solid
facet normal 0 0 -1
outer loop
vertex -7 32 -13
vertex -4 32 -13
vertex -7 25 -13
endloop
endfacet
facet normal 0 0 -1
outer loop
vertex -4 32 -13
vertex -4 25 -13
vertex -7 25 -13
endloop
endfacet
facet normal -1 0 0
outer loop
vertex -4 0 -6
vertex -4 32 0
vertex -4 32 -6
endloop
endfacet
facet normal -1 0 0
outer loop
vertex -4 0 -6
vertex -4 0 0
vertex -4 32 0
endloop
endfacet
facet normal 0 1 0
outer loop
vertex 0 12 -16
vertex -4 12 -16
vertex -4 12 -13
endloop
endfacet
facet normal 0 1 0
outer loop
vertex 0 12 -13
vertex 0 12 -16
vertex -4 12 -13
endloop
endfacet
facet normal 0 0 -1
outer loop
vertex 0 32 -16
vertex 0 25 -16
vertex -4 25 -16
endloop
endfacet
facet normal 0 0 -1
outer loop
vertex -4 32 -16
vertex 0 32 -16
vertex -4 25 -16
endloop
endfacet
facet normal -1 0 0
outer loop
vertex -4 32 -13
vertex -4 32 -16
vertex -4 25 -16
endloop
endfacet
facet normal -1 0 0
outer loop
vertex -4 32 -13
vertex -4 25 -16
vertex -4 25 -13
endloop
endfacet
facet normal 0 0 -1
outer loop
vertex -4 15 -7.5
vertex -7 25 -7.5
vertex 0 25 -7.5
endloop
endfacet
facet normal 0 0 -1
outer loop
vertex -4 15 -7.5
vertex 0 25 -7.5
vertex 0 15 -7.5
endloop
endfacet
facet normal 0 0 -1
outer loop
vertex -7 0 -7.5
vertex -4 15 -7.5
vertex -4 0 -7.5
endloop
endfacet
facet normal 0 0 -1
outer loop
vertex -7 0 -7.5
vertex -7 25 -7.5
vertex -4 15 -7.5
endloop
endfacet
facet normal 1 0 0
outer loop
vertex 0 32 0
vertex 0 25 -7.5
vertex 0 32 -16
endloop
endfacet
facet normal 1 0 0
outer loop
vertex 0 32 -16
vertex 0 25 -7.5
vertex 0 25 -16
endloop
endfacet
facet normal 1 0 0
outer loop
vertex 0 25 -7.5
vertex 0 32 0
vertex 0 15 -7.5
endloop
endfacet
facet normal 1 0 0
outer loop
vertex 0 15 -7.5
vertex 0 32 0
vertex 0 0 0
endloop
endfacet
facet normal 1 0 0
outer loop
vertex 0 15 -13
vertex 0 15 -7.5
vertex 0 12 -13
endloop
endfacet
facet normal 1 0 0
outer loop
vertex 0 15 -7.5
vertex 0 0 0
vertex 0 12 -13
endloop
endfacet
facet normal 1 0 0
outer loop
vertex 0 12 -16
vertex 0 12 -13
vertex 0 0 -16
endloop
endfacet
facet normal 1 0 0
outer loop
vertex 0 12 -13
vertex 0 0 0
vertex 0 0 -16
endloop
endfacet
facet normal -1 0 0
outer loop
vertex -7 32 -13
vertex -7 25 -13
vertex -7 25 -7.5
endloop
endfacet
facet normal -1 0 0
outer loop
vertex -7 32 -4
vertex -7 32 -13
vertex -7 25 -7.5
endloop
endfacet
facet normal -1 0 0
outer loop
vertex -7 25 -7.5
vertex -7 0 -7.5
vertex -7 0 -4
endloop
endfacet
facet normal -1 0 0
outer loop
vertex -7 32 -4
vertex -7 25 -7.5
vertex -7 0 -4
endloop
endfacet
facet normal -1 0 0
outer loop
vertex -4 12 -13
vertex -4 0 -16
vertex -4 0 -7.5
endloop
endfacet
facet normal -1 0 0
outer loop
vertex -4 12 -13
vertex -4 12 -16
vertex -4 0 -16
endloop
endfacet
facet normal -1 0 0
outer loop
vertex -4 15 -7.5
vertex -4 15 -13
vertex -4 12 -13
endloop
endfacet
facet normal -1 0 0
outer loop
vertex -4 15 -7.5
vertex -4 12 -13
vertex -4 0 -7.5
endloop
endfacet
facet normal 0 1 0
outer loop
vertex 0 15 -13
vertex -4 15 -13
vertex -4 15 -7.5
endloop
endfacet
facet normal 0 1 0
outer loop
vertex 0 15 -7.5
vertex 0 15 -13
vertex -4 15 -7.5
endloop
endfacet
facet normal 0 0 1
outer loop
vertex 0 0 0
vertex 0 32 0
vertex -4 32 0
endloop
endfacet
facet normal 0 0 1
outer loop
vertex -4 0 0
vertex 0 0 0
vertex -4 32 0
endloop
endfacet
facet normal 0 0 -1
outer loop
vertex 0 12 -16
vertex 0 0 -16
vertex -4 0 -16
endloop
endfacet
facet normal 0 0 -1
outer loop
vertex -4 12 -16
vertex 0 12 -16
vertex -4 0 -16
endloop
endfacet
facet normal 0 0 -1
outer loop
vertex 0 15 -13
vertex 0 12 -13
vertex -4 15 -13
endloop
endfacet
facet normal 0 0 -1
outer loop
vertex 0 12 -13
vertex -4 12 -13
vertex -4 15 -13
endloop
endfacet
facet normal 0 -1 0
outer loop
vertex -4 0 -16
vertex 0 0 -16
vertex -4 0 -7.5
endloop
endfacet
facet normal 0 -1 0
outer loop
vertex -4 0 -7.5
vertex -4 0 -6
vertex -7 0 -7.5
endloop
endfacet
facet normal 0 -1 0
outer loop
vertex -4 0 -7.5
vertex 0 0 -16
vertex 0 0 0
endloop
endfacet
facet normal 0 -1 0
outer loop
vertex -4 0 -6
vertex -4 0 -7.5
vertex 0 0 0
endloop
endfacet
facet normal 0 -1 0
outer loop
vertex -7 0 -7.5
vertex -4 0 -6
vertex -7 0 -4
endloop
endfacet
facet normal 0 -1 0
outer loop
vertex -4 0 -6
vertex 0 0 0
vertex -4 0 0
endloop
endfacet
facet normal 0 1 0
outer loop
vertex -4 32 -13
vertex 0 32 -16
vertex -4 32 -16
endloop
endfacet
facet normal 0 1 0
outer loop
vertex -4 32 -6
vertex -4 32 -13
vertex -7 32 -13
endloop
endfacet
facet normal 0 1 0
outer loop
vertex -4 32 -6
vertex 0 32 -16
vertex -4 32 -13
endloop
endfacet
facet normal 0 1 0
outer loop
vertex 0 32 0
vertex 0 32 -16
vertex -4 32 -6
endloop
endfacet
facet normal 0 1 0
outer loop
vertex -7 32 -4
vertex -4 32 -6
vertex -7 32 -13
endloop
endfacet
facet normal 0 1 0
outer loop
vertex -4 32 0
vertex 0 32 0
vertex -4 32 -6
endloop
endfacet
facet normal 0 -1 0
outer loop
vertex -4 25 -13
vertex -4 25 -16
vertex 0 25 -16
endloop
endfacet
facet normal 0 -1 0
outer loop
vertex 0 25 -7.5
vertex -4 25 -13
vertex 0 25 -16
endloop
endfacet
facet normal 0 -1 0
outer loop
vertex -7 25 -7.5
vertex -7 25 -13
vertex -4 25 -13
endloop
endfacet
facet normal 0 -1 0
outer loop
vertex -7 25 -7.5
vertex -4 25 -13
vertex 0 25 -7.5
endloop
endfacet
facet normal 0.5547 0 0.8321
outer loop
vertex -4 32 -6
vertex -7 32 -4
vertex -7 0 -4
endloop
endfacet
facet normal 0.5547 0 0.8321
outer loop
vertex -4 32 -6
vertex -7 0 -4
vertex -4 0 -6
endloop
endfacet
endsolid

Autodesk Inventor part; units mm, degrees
ref_plane "YZ Plane" through (0, 0, 0) normal (1, 0, 0) x (0, 1, 0)
ref_plane "XZ Plane" through (0, 0, 0) normal (0, 1, 0) x (-1, 0, 0)
ref_plane "XY Plane" through (0, 0, 0) normal (0, 0, 1) x (1, 0, 0)
sketch "Sketch1" plane through (0, 0, 0) normal (0, 1, 0) x (-1, 0, 0)
  line L0 (0, 0) -> (0, -16)
  line L1 (0, -16) -> (4, -16)
  line L2 (0, 0) -> (4, 0)
  line L3 (4, 0) -> (4, -6)
  line L4 (4, -16) -> (4, -13)
  line L5 (4, -13) -> (7, -13)
  line L6 (7, -13) -> (7, -4)
  line L7 (7, -4) -> (4, -6)
  dimension "d0" = 16
  dimension "d1" = 4
  dimension "d2" = 6
  dimension "d3" = 3
  dimension "d4" = 3
  dimension "d5" = 9
extrude "Extrusion1" add sketch "Sketch1" along normal blind 32
sketch "Sketch2" plane through (-7, 0, -13) normal (-1, 0, 0) x (0, 0, 1)
  line L0 (0, 0) -> (9, 0) projected
  line L1 (9, 0) -> (9, 32) projected
  line L2 (0, 32) -> (9, 32) projected
  line L3 (0, 0) -> (0, 32) projected
  line L4 (0, 0) -> (9, 0) projected
  line L5 (5.5, 0) -> (5.5, 25)
  line L6 (5.5, 25) -> (0, 25)
  point P0 (13, 0)
  dimension "d8" = 25
  dimension "d9" = 5.5
extrude "Extrusion2" cut sketch "Sketch2" against normal blind 3 contours L3 L6 L5 L0
sketch "Sketch3" plane through (-4, 0, -16) normal (-1, 0, 0) x (0, 0, 1)
  line L0 (0, 0) -> (8.5, 0) projected
  line L1 (8.5, 25) -> (8.5, 0) projected
  line L2 (3, 25) -> (8.5, 25) projected
  line L3 (3, 25) -> (3, 32) projected
  line L4 (0, 32) -> (3, 32) projected
  line L5 (0, 0) -> (0, 32) projected
  line L6 (0, 0) -> (8.5, 0) projected
  line L7 (0, 0) -> (0, 12)
  line L8 (0, 0) -> (0, 32) projected
  line L9 (0, 12) -> (3, 12)
  line L10 (3, 12) -> (3, 15)
  line L11 (3, 15) -> (8.5, 15)
  line L12 (8.5, 25) -> (8.5, 0) projected
  line L13 (3, 25) -> (3, 32) projected
  line L14 (3, 25) -> (0, 25)
  point P0 (16, 0)
  dimension "d12" = 12
  dimension "d13" = 3
  dimension "d14" = 3
extrude "Extrusion3" cut sketch "Sketch3" against normal blind 4 contours L5 L14 L2 L1 L11 L10 L9
properties part number "Inner Rails 2"
